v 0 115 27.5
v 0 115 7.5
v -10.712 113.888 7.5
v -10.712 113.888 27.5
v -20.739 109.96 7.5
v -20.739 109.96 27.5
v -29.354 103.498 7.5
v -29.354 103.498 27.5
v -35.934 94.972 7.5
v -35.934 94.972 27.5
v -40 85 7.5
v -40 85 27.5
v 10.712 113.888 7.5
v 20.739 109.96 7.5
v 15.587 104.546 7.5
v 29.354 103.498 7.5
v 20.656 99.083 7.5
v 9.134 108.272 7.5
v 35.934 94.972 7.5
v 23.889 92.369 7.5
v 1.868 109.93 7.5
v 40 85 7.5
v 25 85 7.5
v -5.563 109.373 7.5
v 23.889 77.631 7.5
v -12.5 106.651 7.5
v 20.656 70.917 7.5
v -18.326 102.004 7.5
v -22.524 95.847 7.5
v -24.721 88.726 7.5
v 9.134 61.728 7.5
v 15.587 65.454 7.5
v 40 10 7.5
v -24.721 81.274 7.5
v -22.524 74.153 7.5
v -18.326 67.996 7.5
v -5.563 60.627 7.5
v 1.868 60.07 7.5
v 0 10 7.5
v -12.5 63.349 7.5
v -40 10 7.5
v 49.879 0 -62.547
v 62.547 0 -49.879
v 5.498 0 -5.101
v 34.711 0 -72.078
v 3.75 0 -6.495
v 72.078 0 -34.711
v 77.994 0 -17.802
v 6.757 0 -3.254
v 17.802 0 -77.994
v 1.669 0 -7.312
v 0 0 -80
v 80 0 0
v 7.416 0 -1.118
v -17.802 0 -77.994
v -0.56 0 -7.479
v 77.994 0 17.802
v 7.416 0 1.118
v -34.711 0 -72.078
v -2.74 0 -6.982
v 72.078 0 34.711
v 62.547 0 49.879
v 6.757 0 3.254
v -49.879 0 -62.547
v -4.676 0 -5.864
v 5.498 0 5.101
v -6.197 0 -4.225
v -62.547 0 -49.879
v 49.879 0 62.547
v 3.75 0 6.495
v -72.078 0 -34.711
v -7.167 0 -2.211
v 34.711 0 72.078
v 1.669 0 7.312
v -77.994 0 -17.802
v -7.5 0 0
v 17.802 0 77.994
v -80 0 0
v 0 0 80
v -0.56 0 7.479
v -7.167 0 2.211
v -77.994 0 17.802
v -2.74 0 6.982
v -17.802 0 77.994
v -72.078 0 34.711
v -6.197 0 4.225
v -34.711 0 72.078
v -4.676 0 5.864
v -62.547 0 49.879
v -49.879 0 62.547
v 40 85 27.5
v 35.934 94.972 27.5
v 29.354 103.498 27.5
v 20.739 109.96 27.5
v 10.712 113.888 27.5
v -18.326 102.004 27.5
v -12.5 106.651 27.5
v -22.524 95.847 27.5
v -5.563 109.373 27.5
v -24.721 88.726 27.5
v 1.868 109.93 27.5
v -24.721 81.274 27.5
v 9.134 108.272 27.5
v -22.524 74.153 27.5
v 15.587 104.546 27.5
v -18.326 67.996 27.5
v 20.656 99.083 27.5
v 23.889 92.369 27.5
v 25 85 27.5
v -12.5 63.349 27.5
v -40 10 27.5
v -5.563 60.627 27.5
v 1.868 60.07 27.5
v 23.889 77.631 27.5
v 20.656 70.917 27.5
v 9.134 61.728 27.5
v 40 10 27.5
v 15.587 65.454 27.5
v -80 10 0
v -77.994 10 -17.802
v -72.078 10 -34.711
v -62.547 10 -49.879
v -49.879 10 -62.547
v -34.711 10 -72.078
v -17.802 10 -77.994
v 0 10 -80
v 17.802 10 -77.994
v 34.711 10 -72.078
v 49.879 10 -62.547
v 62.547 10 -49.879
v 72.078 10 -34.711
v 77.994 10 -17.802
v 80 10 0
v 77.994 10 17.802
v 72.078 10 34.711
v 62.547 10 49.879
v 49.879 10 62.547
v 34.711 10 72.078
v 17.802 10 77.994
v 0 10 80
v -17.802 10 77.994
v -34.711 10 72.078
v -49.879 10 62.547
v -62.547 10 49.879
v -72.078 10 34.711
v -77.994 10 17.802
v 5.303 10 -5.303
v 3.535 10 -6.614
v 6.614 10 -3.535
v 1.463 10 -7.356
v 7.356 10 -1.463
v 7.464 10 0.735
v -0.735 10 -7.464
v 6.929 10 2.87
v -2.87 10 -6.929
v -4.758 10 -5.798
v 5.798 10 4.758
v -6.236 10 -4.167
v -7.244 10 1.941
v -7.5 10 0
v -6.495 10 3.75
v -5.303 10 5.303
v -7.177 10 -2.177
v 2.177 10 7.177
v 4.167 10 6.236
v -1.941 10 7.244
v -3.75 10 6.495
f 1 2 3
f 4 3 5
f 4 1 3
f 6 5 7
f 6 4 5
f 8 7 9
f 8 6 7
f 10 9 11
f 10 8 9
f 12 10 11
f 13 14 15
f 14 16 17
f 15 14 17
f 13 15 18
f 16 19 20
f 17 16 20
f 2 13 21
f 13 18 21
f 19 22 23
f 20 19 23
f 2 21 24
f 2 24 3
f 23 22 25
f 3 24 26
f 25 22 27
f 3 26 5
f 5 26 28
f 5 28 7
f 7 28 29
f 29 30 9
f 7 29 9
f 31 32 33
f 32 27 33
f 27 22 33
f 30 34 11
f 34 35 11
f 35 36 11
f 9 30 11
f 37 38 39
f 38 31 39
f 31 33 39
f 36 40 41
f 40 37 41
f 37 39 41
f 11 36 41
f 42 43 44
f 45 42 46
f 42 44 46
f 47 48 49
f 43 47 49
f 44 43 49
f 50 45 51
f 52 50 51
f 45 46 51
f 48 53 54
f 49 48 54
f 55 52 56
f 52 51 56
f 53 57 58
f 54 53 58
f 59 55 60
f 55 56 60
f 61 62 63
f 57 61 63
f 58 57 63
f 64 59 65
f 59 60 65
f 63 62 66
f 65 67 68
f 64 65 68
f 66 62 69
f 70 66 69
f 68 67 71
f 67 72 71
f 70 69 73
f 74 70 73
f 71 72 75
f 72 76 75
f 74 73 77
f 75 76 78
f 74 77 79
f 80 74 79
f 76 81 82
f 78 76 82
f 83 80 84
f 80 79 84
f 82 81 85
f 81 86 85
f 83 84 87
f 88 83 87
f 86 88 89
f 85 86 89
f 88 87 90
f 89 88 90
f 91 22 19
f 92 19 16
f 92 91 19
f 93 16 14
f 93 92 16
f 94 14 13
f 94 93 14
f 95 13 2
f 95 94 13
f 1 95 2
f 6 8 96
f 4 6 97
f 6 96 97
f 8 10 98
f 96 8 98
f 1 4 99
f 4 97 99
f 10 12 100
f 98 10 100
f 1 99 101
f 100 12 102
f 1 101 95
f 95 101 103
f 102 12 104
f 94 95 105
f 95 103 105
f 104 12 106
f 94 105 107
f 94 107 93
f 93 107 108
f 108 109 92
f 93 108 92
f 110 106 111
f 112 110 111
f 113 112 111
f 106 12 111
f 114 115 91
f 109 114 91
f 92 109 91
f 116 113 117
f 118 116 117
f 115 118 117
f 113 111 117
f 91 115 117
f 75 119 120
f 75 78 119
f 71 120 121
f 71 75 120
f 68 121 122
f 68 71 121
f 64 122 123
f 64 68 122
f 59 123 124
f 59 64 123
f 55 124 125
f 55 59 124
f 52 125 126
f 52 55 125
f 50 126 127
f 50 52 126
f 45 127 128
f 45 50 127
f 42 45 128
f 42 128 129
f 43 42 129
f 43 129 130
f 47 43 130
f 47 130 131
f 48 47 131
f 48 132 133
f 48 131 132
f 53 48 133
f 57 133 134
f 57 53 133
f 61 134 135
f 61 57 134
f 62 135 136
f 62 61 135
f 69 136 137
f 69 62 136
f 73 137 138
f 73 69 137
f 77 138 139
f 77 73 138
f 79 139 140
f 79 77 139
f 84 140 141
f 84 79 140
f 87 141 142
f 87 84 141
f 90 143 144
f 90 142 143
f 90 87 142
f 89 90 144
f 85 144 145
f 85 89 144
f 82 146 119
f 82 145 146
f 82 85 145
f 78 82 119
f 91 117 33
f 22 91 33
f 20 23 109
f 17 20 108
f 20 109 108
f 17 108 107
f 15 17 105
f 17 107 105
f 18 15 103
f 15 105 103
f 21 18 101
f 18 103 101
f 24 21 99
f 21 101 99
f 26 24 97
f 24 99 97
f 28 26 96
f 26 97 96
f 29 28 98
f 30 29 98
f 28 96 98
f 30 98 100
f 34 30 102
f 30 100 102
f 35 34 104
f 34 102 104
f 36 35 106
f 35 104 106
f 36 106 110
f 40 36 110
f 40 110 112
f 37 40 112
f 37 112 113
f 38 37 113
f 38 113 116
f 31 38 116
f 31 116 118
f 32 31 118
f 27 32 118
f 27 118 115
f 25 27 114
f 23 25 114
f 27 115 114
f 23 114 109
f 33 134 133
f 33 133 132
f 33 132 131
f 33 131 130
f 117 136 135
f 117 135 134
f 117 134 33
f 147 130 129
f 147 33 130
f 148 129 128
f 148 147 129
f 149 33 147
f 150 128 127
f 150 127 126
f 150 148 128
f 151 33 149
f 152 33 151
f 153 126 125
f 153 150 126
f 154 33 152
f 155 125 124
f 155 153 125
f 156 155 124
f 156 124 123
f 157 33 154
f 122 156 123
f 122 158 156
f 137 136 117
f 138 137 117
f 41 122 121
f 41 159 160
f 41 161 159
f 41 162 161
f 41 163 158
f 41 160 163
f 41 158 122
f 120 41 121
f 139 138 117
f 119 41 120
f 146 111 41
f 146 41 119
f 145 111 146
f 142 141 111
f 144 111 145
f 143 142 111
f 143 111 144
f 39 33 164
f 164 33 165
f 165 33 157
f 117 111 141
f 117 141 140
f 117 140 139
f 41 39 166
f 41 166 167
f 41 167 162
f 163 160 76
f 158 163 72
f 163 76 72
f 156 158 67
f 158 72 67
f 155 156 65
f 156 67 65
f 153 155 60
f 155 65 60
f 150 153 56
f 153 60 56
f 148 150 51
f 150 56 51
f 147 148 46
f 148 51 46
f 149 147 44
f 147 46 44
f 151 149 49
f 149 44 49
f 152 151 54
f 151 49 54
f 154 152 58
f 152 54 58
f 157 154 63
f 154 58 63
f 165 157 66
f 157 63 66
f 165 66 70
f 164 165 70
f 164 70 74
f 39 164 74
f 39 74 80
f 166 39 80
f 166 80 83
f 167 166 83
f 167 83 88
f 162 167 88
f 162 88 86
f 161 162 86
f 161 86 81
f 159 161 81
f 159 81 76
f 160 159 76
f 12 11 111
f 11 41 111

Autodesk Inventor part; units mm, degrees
ref_plane "YZ Plane" through (0, 0, 0) normal (1, 0, 0) x (0, 1, 0)
ref_plane "XZ Plane" through (0, 0, 0) normal (0, 1, 0) x (-1, 0, 0)
ref_plane "XY Plane" through (0, 0, 0) normal (0, 0, 1) x (1, 0, 0)
sketch "Sketch1" plane through (0, 0, 0) normal (0, 1, 0) x (-1, 0, 0)
  circle A0 centre (0, 0) radius 80
  circle A1 centre (0, 0) radius 7.5
  dimension "d0" = 160
  dimension "d1" = 15
extrude "Extrusion1" add sketch "Sketch1" along normal blind 10
sketch "Sketch2" plane through (0, 10, 0) normal (0, 1, 0) x (1, 0, 0)
  circle A0 centre (0, 0) radius 7.5 projected
  line L0 (0, -7.5) -> (-40, -7.5)
  line L1 (-40, -7.5) -> (-40, -27.5)
  line L2 (-40, -27.5) -> (0, -27.5)
  line L3 (0, -27.5) -> (0, -7.5)
  line L4 (0, -27.5) -> (40, -27.5)
  line L5 (40, -27.5) -> (40, -7.5)
  line L6 (40, -7.5) -> (0, -7.5)
  line L7 (0, -7.5) -> (0, -27.5)
  dimension "d4" = 40
  dimension "d5" = 20
  dimension "d6" = 40
extrude "Extrusion2" add sketch "Sketch2" along normal blind 150 contours L6 L5 L4 L3 | L3 L2 L1 L0
sketch "Sketch3" plane through (-40, 10, 27.5) normal (0, 0, 1) x (1, 0, 0)
  circle A0 centre (40, 75) radius 25
  line L0 (0, 150) -> (80, 150) projected
  line L1 (80, 0) -> (80, 150) projected
  line L2 (0, 150) -> (80, 150)
  line L3 (80, 150) -> (80, 105)
  line L4 (80, 105) -> (0, 105)
  line L5 (0, 105) -> (0, 150)
  line L6 (0, 0) -> (0, 150) projected
  arc A1 (40, 105) -> (0, 75) centre (38.735, 65.02) ccw
  arc A2 (80, 75) -> (40, 105) centre (41.265, 65.02) ccw
  point P0 (40, -10)
  dimension "d9" = 50
  dimension "d10" = 45
  dimension "d11" = 40
  dimension "d12" = 40
extrude "Extrusion3" cut sketch "Sketch3" against normal blind 21.45 contours A0 | L0 L1 L4 A2 A1 L5 | L4 A1 L6 | L1 A2 L4
sketch "Sketch4" plane through (-40, 10, 27.5) normal (0, 0, 1) x (1, 0, 0)
  point P0 (40, -10)
properties part number "Base Top"
